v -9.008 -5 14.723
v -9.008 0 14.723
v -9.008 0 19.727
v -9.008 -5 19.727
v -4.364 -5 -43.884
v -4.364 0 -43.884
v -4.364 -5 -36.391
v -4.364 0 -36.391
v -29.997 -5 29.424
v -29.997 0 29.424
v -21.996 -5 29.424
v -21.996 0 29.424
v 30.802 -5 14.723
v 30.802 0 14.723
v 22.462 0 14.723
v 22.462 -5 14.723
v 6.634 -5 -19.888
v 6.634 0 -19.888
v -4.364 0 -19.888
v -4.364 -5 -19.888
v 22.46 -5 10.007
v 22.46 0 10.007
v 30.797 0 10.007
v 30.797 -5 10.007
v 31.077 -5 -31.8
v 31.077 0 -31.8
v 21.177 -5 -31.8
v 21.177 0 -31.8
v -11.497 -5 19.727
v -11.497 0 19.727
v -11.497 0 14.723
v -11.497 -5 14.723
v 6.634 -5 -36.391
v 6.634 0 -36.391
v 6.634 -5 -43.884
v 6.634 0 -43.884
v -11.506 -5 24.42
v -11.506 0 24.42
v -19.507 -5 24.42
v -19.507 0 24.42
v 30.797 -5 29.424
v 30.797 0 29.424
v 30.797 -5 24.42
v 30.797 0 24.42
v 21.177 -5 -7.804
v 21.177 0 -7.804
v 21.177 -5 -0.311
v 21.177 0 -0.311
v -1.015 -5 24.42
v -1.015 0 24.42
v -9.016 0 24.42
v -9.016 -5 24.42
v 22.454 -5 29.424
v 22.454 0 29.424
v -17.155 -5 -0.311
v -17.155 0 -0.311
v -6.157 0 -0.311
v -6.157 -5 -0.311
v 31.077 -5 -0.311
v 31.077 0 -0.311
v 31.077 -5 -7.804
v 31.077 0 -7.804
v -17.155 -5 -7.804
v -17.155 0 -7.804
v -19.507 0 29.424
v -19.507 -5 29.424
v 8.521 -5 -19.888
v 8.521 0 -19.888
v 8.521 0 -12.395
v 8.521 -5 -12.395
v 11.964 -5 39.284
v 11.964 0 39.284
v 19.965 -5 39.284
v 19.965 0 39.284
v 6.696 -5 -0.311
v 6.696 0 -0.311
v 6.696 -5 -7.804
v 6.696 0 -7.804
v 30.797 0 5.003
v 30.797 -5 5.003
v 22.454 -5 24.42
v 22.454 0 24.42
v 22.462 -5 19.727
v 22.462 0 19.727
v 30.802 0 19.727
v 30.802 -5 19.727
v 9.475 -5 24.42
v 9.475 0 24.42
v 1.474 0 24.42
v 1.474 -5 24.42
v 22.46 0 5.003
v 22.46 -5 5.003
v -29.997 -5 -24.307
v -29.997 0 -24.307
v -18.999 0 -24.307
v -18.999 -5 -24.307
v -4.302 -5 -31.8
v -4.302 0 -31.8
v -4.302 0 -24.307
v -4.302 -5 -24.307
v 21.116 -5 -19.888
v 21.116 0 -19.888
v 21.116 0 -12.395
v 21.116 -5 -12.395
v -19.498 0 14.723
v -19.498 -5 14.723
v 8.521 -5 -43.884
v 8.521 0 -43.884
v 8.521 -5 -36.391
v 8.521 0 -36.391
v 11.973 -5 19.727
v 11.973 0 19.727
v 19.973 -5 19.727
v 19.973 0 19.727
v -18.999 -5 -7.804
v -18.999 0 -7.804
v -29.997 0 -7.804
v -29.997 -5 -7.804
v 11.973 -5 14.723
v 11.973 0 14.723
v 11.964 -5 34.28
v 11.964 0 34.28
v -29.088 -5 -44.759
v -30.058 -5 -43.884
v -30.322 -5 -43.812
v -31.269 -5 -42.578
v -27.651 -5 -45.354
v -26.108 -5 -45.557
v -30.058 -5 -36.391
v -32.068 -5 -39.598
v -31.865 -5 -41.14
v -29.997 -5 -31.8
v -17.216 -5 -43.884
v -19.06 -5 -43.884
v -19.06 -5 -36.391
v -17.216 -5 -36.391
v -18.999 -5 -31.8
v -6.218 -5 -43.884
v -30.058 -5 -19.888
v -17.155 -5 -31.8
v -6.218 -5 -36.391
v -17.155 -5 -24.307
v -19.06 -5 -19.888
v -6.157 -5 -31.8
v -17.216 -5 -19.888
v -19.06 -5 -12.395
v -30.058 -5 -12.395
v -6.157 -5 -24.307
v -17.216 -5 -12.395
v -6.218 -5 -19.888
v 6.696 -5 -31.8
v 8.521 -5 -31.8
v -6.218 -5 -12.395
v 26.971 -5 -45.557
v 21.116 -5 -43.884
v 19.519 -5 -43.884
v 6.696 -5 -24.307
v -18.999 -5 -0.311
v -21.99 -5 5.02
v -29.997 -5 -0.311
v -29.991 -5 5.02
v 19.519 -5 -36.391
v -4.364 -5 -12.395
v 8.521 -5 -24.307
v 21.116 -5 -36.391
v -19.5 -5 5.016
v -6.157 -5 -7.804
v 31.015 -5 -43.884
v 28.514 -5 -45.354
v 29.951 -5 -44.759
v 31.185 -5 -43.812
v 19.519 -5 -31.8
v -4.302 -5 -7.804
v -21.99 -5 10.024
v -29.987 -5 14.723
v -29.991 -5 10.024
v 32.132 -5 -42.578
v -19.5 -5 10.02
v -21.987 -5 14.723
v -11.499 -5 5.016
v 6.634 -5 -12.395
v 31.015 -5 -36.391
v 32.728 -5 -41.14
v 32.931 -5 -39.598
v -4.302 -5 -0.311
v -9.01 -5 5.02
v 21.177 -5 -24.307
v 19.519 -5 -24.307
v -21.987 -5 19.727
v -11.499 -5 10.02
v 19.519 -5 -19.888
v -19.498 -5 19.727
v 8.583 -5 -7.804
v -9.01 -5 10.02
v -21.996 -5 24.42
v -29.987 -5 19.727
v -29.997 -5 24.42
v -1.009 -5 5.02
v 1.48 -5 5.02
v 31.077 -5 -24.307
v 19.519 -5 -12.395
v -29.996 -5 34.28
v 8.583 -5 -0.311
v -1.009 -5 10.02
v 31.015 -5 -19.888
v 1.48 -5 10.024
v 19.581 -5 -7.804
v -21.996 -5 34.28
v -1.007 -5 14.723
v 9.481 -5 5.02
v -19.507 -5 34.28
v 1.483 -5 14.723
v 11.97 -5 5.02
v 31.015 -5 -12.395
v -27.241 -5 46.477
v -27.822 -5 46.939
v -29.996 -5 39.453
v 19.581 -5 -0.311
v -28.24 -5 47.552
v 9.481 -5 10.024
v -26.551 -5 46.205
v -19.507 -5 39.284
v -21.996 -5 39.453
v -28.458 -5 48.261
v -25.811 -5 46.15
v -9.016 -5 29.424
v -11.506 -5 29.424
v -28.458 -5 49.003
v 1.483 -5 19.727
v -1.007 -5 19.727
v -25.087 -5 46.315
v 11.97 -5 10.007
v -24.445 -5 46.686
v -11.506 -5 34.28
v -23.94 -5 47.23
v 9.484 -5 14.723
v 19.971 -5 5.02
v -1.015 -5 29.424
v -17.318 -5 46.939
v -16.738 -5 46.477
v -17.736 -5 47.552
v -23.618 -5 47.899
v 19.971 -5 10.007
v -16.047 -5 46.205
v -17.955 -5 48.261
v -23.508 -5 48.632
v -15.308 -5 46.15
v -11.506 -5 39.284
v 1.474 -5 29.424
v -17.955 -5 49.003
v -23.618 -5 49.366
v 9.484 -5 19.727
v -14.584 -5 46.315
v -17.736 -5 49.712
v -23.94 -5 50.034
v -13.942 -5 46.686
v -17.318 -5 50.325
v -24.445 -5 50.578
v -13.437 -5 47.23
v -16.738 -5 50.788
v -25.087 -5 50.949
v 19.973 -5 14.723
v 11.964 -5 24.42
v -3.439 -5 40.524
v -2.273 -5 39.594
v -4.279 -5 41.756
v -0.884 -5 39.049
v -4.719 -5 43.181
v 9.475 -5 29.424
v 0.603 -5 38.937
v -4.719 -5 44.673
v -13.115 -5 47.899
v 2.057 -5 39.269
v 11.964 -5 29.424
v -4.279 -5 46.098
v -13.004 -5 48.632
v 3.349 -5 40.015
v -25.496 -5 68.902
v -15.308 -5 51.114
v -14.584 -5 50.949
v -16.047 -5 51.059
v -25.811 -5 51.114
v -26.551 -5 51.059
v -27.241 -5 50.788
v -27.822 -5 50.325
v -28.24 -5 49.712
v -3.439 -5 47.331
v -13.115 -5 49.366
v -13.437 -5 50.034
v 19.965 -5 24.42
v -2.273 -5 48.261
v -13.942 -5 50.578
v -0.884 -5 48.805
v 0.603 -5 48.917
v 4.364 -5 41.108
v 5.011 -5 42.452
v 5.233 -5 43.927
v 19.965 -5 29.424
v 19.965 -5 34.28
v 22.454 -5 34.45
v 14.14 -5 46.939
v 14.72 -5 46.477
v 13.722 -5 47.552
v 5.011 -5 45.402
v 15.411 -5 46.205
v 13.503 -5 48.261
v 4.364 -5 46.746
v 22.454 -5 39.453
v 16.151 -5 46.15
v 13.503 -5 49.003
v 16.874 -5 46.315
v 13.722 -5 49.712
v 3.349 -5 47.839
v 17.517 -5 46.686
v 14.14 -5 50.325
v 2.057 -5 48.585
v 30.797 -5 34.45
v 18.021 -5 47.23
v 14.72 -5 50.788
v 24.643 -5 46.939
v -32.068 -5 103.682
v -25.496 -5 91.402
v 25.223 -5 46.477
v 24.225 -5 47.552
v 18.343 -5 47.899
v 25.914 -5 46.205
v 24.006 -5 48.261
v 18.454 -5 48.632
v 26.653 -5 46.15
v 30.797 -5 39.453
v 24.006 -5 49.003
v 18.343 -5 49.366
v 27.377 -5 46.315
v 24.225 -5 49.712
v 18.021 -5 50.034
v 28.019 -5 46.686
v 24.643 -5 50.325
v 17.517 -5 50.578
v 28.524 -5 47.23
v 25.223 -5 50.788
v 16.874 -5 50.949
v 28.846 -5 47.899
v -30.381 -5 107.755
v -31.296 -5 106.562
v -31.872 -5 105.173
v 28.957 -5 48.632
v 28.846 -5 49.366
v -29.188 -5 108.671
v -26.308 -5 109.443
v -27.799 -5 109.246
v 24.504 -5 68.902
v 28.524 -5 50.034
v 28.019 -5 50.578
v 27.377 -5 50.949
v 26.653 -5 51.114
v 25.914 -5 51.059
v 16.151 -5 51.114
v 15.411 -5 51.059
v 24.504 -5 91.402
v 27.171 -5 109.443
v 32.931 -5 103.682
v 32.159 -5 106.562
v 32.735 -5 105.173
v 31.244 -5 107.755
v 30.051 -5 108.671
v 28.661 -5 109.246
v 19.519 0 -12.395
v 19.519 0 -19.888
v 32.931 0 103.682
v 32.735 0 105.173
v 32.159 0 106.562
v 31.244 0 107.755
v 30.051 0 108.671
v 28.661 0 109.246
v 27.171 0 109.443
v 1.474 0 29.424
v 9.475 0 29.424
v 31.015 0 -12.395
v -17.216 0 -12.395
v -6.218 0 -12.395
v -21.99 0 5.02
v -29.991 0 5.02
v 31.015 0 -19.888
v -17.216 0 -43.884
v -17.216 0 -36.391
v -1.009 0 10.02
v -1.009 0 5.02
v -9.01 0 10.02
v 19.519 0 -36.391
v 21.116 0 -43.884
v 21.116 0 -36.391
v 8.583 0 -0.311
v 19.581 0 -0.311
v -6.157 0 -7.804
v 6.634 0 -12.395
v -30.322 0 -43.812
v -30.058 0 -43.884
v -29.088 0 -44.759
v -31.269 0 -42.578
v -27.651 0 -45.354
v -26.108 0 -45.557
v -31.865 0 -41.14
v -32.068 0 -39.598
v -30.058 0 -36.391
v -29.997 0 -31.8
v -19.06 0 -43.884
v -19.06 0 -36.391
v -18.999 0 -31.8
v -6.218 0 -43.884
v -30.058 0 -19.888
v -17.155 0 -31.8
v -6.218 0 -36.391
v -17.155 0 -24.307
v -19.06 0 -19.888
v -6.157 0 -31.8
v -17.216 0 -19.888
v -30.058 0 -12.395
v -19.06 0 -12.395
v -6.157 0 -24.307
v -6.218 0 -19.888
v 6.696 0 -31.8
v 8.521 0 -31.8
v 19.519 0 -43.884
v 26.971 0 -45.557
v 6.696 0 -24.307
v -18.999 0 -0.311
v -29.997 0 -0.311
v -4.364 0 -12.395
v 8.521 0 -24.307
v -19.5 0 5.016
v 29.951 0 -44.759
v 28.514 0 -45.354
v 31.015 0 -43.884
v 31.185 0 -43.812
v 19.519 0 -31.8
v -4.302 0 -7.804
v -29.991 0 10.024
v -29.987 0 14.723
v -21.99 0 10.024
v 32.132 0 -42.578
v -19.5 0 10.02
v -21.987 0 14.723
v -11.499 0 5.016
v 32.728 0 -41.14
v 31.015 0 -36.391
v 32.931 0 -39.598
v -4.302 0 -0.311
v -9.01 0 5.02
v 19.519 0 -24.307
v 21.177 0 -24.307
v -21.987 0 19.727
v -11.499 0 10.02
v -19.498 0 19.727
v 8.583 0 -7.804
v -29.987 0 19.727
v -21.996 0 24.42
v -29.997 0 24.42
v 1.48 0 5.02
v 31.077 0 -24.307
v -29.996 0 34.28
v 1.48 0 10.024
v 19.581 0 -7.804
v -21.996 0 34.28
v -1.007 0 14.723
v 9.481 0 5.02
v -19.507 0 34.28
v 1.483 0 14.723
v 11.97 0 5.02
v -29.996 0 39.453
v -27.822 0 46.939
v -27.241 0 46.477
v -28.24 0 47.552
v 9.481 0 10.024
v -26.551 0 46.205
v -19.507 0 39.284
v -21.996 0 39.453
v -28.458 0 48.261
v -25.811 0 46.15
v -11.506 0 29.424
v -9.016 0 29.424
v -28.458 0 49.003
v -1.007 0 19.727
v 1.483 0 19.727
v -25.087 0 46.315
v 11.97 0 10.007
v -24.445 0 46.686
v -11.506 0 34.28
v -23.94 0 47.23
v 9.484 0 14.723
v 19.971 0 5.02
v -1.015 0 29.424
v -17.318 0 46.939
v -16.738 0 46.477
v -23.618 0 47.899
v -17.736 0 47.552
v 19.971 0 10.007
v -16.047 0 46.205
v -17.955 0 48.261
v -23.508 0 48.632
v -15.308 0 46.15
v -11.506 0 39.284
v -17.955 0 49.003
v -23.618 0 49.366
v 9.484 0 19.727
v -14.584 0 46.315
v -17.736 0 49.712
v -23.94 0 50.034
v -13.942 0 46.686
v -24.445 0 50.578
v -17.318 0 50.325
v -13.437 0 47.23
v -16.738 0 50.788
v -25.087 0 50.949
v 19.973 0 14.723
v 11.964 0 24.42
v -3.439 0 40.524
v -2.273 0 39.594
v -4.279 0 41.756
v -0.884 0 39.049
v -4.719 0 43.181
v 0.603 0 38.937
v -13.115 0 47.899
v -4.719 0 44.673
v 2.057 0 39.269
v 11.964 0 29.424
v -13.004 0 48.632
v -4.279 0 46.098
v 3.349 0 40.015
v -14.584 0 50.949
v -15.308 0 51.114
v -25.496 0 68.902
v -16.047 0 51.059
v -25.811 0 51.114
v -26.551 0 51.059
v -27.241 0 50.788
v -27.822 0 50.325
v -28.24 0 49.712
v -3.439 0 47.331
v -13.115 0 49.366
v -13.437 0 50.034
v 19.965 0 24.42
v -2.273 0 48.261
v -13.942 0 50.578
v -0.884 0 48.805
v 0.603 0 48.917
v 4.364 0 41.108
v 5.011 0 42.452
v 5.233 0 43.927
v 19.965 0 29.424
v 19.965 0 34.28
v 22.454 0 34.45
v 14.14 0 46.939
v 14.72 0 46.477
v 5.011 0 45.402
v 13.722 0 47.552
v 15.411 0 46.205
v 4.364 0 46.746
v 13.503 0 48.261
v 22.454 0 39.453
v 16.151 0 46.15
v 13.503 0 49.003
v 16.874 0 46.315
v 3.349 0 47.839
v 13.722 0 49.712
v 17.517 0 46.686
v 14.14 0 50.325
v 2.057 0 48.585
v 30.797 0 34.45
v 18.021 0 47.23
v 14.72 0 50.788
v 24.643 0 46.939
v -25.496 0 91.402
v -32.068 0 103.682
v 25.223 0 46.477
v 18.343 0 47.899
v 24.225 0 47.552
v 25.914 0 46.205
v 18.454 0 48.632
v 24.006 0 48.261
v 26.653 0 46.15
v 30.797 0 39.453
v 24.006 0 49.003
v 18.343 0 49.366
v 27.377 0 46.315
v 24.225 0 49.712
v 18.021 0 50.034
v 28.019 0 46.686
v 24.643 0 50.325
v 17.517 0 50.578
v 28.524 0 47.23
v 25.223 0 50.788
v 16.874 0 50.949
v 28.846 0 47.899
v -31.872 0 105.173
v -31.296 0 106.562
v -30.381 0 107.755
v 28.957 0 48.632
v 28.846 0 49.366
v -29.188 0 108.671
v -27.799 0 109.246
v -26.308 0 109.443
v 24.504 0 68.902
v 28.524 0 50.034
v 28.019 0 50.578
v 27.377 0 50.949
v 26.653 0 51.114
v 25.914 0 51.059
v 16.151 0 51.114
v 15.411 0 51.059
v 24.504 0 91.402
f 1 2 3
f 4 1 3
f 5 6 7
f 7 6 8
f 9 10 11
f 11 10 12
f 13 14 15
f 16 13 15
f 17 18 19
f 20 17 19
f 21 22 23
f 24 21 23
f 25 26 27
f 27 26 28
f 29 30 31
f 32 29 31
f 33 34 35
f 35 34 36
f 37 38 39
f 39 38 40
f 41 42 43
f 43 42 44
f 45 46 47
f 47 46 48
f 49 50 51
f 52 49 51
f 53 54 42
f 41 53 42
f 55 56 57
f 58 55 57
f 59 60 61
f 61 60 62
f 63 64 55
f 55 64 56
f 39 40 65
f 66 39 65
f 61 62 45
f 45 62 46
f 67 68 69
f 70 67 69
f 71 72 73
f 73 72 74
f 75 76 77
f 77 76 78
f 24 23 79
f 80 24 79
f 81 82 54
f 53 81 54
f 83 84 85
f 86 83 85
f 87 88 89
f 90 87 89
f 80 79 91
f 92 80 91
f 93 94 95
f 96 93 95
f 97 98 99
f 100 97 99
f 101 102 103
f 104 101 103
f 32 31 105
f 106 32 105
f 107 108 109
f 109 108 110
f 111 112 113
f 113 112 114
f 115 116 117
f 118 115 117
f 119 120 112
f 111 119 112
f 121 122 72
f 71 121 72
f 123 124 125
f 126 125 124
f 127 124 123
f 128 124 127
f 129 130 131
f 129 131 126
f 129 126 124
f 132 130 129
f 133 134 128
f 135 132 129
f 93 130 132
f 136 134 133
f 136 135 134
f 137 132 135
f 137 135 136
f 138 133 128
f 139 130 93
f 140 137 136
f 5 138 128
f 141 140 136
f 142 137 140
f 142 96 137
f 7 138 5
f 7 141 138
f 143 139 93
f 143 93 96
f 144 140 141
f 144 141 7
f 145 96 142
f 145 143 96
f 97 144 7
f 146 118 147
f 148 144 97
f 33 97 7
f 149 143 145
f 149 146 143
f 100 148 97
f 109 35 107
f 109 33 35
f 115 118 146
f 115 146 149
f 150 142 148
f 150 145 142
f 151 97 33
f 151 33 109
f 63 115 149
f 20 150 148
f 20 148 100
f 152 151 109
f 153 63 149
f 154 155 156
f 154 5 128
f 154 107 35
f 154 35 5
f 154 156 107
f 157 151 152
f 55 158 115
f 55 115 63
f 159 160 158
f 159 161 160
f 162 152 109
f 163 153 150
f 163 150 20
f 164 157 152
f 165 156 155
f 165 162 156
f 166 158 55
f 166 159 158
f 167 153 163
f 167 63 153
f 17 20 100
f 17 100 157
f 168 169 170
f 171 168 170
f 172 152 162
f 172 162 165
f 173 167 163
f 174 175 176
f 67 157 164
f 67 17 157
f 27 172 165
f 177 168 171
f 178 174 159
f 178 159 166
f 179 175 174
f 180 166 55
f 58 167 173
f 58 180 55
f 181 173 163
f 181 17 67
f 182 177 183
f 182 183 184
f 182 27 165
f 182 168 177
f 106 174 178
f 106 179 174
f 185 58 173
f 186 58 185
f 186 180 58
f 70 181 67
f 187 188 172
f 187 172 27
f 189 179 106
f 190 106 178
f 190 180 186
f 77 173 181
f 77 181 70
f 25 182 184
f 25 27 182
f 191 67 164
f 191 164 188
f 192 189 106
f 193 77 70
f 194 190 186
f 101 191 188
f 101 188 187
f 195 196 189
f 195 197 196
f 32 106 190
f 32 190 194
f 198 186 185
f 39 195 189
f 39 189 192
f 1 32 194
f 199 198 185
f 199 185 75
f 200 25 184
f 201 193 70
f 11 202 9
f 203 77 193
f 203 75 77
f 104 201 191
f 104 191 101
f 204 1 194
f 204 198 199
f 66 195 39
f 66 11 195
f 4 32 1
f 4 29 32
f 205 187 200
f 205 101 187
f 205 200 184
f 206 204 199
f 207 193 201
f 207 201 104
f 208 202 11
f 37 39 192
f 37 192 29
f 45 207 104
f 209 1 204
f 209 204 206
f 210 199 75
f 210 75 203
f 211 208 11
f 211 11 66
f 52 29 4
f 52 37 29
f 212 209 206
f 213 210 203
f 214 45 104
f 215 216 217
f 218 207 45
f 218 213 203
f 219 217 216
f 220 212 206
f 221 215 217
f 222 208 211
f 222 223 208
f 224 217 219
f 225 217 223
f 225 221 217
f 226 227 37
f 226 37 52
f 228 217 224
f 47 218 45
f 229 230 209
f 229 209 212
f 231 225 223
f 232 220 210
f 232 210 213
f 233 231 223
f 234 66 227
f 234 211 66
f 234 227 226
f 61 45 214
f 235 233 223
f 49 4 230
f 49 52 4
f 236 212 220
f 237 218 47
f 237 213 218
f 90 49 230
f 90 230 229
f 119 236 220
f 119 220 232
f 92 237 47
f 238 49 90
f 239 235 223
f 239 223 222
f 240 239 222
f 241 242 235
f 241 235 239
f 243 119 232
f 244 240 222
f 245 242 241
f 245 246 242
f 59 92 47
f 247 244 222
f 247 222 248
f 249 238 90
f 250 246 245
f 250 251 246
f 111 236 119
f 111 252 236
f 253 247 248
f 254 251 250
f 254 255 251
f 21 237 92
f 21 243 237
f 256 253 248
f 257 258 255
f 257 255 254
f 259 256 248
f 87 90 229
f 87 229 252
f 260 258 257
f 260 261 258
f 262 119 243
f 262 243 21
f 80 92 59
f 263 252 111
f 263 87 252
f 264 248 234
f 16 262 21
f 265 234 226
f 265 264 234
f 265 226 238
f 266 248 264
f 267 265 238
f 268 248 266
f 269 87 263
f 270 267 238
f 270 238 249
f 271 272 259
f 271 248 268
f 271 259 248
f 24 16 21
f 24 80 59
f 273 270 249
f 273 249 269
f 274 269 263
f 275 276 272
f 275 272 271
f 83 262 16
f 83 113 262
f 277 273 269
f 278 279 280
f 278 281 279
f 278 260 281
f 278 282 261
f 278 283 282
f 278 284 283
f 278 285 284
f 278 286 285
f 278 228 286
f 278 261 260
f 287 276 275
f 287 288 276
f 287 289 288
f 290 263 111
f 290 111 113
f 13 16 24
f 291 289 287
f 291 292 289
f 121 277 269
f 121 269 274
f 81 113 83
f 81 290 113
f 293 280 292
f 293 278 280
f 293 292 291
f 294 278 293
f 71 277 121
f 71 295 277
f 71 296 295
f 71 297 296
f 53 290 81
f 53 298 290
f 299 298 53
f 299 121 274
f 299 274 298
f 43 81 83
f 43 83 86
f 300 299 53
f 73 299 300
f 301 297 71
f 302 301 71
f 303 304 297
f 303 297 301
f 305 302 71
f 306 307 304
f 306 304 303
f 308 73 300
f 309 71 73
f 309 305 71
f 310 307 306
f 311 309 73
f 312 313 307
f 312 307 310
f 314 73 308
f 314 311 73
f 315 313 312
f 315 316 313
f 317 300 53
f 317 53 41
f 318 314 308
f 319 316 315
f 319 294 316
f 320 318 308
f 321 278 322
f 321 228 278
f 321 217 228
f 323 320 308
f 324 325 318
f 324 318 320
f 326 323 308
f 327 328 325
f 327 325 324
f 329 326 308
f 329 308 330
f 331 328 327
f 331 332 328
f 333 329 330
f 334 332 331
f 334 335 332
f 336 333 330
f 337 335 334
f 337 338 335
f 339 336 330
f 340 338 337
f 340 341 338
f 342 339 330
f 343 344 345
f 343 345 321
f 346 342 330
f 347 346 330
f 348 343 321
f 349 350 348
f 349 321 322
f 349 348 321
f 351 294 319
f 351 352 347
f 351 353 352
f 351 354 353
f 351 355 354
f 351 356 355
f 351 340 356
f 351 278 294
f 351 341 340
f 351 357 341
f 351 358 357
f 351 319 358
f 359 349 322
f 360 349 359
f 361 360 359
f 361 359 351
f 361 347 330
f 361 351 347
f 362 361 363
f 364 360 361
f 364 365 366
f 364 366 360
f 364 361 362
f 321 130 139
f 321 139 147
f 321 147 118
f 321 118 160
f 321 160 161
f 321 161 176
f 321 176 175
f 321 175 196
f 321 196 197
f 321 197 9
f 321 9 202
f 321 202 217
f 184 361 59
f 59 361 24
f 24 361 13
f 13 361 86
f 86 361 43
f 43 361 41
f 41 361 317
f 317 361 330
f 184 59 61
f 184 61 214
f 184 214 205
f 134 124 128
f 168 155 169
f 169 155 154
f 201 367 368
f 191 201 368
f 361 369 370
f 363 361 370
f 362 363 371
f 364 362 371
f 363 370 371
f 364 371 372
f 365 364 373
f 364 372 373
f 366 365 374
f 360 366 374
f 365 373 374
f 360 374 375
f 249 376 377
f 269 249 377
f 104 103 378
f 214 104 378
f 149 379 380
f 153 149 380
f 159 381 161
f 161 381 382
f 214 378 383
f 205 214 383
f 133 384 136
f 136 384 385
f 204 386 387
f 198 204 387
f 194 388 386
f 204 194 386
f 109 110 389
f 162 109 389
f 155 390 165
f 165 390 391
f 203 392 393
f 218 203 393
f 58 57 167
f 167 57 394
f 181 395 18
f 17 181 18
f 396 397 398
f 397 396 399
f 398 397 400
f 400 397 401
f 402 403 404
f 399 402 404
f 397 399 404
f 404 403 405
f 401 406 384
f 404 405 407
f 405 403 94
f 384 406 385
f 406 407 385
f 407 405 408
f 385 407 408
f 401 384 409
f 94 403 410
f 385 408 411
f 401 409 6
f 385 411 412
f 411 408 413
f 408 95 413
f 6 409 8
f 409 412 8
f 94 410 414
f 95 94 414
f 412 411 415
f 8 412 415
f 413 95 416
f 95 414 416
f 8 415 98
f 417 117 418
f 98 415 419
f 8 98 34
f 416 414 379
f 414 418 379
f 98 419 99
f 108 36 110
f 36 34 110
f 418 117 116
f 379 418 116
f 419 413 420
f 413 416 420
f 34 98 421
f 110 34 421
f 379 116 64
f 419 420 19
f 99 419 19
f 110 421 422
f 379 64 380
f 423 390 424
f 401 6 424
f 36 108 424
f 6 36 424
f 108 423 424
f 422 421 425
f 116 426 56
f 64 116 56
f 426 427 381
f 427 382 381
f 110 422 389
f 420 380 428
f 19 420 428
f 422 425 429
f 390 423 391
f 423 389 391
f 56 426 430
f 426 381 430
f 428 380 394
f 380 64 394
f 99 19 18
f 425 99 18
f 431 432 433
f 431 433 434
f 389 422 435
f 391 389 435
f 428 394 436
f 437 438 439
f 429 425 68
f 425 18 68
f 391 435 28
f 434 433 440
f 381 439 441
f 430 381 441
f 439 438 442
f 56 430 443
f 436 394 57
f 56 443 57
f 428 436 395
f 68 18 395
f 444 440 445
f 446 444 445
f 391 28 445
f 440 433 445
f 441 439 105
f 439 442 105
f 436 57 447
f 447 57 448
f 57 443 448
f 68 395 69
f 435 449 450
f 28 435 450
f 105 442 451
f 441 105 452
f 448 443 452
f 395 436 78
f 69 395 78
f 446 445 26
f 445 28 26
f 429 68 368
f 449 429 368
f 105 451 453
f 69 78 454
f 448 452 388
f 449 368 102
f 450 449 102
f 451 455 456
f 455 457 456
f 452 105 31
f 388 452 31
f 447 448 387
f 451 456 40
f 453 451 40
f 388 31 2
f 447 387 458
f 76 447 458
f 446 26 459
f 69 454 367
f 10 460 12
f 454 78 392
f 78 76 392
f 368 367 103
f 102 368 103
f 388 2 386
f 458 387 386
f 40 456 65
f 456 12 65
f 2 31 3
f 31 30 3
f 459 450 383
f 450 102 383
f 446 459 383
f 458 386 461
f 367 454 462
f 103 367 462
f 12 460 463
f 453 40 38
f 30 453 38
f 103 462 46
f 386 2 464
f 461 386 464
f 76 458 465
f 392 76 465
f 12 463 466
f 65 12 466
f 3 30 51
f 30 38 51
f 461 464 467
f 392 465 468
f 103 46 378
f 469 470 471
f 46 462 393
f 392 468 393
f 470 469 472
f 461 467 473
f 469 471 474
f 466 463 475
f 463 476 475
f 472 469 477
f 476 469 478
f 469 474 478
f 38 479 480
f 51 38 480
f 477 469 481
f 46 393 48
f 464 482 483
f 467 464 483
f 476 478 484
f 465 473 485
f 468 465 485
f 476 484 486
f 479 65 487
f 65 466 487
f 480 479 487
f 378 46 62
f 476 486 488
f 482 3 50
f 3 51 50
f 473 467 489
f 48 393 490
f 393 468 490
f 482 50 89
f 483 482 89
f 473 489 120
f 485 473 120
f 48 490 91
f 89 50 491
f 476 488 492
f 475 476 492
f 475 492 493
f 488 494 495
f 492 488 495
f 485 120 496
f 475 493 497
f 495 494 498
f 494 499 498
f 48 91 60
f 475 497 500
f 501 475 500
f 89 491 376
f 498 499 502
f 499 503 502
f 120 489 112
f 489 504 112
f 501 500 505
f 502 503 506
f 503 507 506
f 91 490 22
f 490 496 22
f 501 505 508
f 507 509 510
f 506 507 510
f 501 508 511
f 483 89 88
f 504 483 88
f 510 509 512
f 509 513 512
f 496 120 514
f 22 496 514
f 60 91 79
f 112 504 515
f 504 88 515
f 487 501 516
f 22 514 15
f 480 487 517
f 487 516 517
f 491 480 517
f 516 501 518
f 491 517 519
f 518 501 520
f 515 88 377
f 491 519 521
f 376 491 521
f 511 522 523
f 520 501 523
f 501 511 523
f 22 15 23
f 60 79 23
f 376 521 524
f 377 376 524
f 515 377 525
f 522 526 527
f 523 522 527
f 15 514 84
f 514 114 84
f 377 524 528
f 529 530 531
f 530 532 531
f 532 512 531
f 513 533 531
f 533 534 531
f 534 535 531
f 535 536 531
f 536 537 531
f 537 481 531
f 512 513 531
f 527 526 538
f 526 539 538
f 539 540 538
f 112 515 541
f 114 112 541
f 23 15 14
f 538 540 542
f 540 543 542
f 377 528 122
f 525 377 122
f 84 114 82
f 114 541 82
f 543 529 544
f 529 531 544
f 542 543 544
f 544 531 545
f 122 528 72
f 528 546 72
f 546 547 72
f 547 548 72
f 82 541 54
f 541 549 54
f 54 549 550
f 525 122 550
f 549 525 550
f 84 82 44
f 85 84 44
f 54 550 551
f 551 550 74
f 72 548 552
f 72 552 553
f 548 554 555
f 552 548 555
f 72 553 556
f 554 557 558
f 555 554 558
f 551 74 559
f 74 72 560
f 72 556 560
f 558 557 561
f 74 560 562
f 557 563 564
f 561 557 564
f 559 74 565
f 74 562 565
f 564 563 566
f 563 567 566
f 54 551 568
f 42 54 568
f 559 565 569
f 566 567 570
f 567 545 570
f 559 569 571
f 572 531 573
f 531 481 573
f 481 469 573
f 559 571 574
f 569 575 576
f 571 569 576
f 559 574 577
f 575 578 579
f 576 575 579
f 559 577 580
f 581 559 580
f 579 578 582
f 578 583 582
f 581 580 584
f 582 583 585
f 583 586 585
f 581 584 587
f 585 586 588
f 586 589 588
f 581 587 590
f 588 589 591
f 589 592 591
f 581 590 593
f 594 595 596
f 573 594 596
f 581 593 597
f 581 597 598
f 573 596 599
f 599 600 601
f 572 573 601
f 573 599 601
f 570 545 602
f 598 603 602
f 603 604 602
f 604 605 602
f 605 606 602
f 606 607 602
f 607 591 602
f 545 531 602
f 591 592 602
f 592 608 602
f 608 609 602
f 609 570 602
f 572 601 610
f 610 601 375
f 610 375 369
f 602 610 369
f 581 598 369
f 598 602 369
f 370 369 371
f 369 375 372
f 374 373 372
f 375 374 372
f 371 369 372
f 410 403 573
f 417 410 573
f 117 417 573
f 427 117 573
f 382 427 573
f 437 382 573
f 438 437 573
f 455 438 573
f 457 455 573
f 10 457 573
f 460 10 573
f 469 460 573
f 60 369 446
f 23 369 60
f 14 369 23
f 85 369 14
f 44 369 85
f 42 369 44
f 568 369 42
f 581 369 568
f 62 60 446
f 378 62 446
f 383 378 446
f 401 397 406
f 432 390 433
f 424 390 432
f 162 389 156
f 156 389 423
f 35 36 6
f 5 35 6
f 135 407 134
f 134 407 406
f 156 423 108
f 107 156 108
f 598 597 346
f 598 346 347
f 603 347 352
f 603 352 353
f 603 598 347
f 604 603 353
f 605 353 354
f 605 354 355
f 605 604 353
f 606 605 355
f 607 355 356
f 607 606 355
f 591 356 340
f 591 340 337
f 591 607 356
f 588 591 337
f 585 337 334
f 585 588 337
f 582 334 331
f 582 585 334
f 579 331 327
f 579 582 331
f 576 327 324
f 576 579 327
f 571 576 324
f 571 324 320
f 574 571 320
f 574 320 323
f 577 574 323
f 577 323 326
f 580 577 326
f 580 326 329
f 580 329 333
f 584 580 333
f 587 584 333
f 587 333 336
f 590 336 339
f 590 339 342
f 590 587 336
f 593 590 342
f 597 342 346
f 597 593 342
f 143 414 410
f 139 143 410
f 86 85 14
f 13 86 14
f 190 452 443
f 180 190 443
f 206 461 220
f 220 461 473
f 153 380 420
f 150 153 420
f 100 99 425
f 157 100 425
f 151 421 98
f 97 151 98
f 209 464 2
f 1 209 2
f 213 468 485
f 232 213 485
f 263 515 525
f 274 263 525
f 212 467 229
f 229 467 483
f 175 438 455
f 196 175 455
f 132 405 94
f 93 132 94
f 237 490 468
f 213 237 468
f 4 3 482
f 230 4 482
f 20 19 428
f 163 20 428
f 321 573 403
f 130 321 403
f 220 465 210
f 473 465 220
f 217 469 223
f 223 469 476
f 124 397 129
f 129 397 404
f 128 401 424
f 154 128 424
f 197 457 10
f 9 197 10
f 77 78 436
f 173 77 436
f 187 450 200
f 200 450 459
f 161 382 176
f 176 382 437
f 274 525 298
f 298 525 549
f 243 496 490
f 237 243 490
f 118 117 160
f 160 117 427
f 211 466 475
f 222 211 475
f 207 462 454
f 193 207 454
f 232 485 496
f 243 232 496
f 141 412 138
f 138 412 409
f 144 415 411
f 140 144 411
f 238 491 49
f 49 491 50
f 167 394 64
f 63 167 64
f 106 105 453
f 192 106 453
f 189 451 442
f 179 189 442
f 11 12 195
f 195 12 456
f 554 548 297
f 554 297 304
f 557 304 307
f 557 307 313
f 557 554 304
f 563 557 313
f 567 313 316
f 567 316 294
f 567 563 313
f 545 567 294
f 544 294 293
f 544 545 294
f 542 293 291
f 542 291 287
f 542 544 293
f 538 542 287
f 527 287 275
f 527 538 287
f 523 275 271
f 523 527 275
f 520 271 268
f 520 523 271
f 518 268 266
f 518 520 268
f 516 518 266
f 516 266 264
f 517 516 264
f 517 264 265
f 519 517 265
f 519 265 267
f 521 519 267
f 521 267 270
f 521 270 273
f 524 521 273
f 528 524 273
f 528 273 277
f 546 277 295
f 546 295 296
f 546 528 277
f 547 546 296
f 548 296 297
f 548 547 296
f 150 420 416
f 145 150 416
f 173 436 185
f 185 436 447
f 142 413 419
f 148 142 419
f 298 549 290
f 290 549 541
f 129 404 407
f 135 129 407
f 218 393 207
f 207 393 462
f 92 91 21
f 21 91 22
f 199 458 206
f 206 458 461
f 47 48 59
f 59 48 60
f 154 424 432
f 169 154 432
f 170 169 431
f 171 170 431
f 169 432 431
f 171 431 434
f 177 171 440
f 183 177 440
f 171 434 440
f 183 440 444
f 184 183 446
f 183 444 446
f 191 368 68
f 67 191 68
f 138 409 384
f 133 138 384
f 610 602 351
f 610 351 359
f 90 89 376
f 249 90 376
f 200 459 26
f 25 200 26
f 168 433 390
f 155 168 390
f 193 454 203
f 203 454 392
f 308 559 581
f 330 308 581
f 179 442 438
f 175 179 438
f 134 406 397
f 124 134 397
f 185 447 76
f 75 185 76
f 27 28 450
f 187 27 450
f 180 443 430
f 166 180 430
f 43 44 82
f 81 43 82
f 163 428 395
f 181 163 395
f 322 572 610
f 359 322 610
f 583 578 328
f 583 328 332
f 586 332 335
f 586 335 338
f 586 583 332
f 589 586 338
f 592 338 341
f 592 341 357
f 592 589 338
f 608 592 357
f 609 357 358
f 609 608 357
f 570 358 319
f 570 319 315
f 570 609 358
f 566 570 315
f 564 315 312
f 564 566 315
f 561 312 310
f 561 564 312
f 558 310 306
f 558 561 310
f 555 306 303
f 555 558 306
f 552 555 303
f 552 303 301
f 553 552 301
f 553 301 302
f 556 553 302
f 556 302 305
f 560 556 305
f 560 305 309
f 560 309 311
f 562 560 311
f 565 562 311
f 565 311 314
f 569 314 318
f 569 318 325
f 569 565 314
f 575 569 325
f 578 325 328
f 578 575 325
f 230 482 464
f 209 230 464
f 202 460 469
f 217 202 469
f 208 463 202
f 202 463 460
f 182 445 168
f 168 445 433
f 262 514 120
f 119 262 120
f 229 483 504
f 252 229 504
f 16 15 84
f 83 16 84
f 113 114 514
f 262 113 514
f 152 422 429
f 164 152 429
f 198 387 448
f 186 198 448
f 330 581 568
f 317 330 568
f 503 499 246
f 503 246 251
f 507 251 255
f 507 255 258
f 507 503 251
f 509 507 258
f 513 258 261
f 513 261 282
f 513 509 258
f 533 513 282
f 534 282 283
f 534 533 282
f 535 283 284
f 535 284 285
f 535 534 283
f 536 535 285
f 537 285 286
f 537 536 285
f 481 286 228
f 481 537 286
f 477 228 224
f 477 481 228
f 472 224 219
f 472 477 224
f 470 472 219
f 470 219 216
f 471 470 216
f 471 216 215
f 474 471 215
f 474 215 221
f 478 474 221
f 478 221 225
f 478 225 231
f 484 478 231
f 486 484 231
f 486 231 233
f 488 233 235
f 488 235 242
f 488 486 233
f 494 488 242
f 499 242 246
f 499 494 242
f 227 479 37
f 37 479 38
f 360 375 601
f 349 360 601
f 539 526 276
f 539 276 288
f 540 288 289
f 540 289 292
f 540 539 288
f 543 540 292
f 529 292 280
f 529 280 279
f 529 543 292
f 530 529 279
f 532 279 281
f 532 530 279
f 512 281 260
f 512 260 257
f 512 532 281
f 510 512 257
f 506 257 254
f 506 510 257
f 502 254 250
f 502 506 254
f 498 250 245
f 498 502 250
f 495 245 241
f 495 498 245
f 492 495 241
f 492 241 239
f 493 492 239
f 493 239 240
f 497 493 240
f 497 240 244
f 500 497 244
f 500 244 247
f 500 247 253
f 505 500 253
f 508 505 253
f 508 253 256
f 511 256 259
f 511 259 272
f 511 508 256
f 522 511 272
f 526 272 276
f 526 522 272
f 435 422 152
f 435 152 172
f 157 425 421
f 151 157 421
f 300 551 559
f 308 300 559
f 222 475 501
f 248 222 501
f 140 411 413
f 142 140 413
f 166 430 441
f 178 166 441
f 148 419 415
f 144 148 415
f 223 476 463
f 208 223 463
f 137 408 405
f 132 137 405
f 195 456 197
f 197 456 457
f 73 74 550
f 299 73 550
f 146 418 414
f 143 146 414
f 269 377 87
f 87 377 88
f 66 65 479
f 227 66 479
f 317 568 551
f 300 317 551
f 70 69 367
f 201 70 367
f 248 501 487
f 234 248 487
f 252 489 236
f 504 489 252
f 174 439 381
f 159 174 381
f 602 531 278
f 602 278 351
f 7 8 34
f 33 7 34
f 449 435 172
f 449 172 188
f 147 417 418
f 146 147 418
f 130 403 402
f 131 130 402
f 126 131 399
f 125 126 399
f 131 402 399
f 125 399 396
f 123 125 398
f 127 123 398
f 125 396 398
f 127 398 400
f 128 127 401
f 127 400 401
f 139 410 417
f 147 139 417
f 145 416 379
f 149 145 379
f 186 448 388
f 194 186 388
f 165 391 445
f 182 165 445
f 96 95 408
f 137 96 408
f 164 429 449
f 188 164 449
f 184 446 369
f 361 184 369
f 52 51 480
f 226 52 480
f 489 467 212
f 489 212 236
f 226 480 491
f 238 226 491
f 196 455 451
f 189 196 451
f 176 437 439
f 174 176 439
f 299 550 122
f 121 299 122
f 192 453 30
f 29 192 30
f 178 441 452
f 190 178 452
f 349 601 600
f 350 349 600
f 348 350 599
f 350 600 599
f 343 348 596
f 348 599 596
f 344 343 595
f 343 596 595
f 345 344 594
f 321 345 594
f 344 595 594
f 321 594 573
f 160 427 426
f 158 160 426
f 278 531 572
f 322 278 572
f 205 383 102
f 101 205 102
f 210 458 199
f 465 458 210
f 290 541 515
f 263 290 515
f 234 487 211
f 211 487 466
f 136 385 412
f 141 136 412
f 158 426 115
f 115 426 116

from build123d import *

# Parameters (mm, degrees)
F0_W     = 10.9982
F0_H     = 7.493
F0_W_2   = 8.001
F0_H_2   = 5.0038
F0_R     = 2.4892
F0_R_2   = 5.0038
F1_DEPTH = 5
F0_W_3   = 50
F0_H_3   = 22.5
F2_DEPTH = 5


with BuildPart() as f1:
    # F0 (on Front) → F1 (new body)
    with BuildSketch(Plane.XZ):
        with BuildLine():
            Line((32.930795, 54.273571), (-32.067805, 54.273571))
            Line((-32.067805, 54.273571), (-32.067805, -39.597668))
            ThreePointArc((-32.067805, -39.597668), (-30.322229, -43.811862), (-26.108036, -45.557438))
            Line((-26.108036, -45.557438), (26.971026, -45.557438))
            ThreePointArc((26.971026, -45.557438), (31.185219, -43.811862), (32.930795, -39.597668))
            Line((32.930795, -39.597668), (32.930795, 54.273571))
        make_face()
        Polygon((-24.558977, -43.883898), (-30.058077, -43.883898), (-30.058077, -36.390898), (-19.059877, -36.390898), (-19.059877, -43.883898), align=None, mode=Mode.SUBTRACT)
        Polygon((-24.497674, -31.799856), (-29.996774, -31.799856), (-29.996774, -24.306856), (-18.998574, -24.306856), (-18.998574, -31.799856), align=None, mode=Mode.SUBTRACT)
        Polygon((-24.558977, -19.887637), (-30.058077, -19.887637), (-30.058077, -12.394637), (-19.059877, -12.394637), (-19.059877, -19.887637), align=None, mode=Mode.SUBTRACT)
        Polygon((-11.717032, -43.883901), (-17.216132, -43.883901), (-17.216132, -36.390901), (-6.217932, -36.390901), (-6.217932, -43.883901), align=None, mode=Mode.SUBTRACT)
        Polygon((-11.655728, -31.799859), (-17.154828, -31.799859), (-17.154828, -24.306859), (-6.156628, -24.306859), (-6.156628, -31.799859), align=None, mode=Mode.SUBTRACT)
        Polygon((-11.717032, -19.887639), (-17.216132, -19.887639), (-17.216132, -12.394639), (-6.217932, -12.394639), (-6.217932, -19.887639), align=None, mode=Mode.SUBTRACT)
        Polygon((-24.497674, -7.803595), (-29.996774, -7.803595), (-29.996774, -0.310595), (-18.998574, -0.310595), (-18.998574, -7.803595), align=None, mode=Mode.SUBTRACT)
        Polygon((-27.643991, 5.020094), (-29.990563, 5.020094), (-29.990563, 10.023894), (-21.989563, 10.023894), (-21.989563, 5.020094), align=None, mode=Mode.SUBTRACT)
        Polygon((-26.28431, 14.722894), (-29.987015, 14.722894), (-29.987015, 19.726694), (-21.987015, 19.726694), (-21.987015, 14.722894), align=None, mode=Mode.SUBTRACT)
        Polygon((-25.983574, 24.419945), (-29.996774, 24.419945), (-29.996774, 29.423745), (-21.995774, 29.423745), (-21.995774, 24.419945), align=None, mode=Mode.SUBTRACT)
        Polygon((-11.655728, -7.803598), (-17.154828, -7.803598), (-17.154828, -0.310598), (-6.156628, -0.310598), (-6.156628, -7.803598), align=None, mode=Mode.SUBTRACT)
        Polygon((-17.148439, 5.016294), (-19.500365, 5.016294), (-19.500365, 10.020094), (-11.499365, 10.020094), (-11.499365, 5.016294), align=None, mode=Mode.SUBTRACT)
        Polygon((-7.183166, 5.020094), (-9.010165, 5.020094), (-9.010165, 10.020094), (-1.009165, 10.020094), (-1.009165, 5.020094), align=None, mode=Mode.SUBTRACT)
        Polygon((-15.484615, 14.722894), (-19.497815, 14.722894), (-19.497815, 19.726694), (-11.496815, 19.726694), (-11.496815, 14.722894), align=None, mode=Mode.SUBTRACT)
        Polygon((-15.493374, 24.419945), (-19.506574, 24.419945), (-19.506574, 29.423745), (-11.505574, 29.423745), (-11.505574, 24.419945), align=None, mode=Mode.SUBTRACT)
        Polygon((-5.823485, 14.722894), (-9.007615, 14.722894), (-9.007615, 19.726694), (-1.006615, 19.726694), (-1.006615, 14.722894), align=None, mode=Mode.SUBTRACT)
        Polygon((-5.52275, 24.419945), (-9.016374, 24.419945), (-9.016374, 29.423745), (-1.015374, 29.423745), (-1.015374, 24.419945), align=None, mode=Mode.SUBTRACT)
        Polygon((1.135368, -43.883901), (-4.363732, -43.883901), (-4.363732, -36.390901), (6.634468, -36.390901), (6.634468, -43.883901), align=None, mode=Mode.SUBTRACT)
        Polygon((1.196672, -31.799859), (-4.302428, -31.799859), (-4.302428, -24.306859), (6.695772, -24.306859), (6.695772, -31.799859), align=None, mode=Mode.SUBTRACT)
        Polygon((14.020374, -43.883901), (8.521274, -43.883901), (8.521274, -36.390901), (19.519474, -36.390901), (19.519474, -43.883901), align=None, mode=Mode.SUBTRACT)
        with Locations((14.020374, -28.053359)):
            Rectangle(F0_W, F0_H, mode=Mode.SUBTRACT)
        Polygon((1.135368, -19.887639), (-4.363732, -19.887639), (-4.363732, -12.394639), (6.634468, -12.394639), (6.634468, -19.887639), align=None, mode=Mode.SUBTRACT)
        Polygon((14.020374, -19.887639), (8.521274, -19.887639), (8.521274, -12.394639), (19.519474, -12.394639), (19.519474, -19.887639), align=None, mode=Mode.SUBTRACT)
        Polygon((25.782729, -43.883901), (21.115824, -43.883901), (21.115824, -36.390901), (31.015452, -36.390901), (31.015452, -43.883901), align=None, mode=Mode.SUBTRACT)
        Polygon((25.844033, -31.799859), (21.177127, -31.799859), (21.177127, -24.306859), (31.076756, -24.306859), (31.076756, -31.799859), align=None, mode=Mode.SUBTRACT)
        Polygon((25.782729, -19.887639), (21.115824, -19.887639), (21.115824, -12.394639), (31.015452, -12.394639), (31.015452, -19.887639), align=None, mode=Mode.SUBTRACT)
        Polygon((1.196672, -7.803598), (-4.302428, -7.803598), (-4.302428, -0.310598), (6.695772, -0.310598), (6.695772, -7.803598), align=None, mode=Mode.SUBTRACT)
        with Locations((5.480535, 7.521994)):
            Rectangle(F0_W_2, F0_H_2, mode=Mode.SUBTRACT)
        Polygon((14.081677, -7.803598), (8.582577, -7.803598), (8.582577, -0.310598), (19.580777, -0.310598), (19.580777, -7.803598), align=None, mode=Mode.SUBTRACT)
        Polygon((12.818122, 5.020094), (11.970235, 5.020094), (11.970235, 10.006707), (19.971235, 10.006707), (19.971235, 5.020094), align=None, mode=Mode.SUBTRACT)
        with Locations((5.483085, 17.224794)):
            Rectangle(F0_W_2, F0_H_2, mode=Mode.SUBTRACT)
        Polygon((9.474826, 24.419945), (1.473826, 24.419945), (1.473826, 29.423745), (9.474826, 29.423745), (9.474826, 26.934545), align=None, mode=Mode.SUBTRACT)
        Polygon((14.177803, 14.722894), (11.972785, 14.722894), (11.972785, 19.726694), (19.972785, 19.726694), (19.972785, 14.722894), align=None, mode=Mode.SUBTRACT)
        Polygon((14.478539, 24.419945), (11.964026, 24.419945), (11.964026, 29.423745), (19.965026, 29.423745), (19.965026, 24.419945), align=None, mode=Mode.SUBTRACT)
        Polygon((25.844033, -7.803598), (21.177127, -7.803598), (21.177127, -0.310598), (31.076756, -0.310598), (31.076756, -7.803598), align=None, mode=Mode.SUBTRACT)
        Polygon((24.846989, 5.002907), (22.460435, 5.002907), (22.460435, 10.006707), (30.797195, 10.006707), (30.797195, 5.002907), align=None, mode=Mode.SUBTRACT)
        Polygon((26.16669, 14.722894), (22.461985, 14.722894), (22.461985, 19.726694), (30.801985, 19.726694), (30.801985, 14.722894), align=None, mode=Mode.SUBTRACT)
        Polygon((26.467426, 24.419945), (22.454226, 24.419945), (22.454226, 29.423745), (30.796636, 29.423745), (30.796636, 24.419945), align=None, mode=Mode.SUBTRACT)
        Polygon((-25.983574, 34.27997), (-29.996351, 34.27997), (-29.996351, 39.453434), (-21.995774, 39.453434), (-21.995774, 34.27997), align=None, mode=Mode.SUBTRACT)
        with Locations((-25.996883, 48.632245)):
            Circle(F0_R, mode=Mode.SUBTRACT)
        Polygon((-15.493374, 34.279969), (-19.506574, 34.279969), (-19.506574, 39.283769), (-11.505574, 39.283769), (-11.505574, 34.279969), align=None, mode=Mode.SUBTRACT)
        with Locations((-15.493563, 48.632245)):
            Circle(F0_R, mode=Mode.SUBTRACT)
        with Locations((0.229226, 43.927145)):
            Circle(F0_R_2, mode=Mode.SUBTRACT)
        Polygon((14.478539, 34.27997), (11.964026, 34.27997), (11.964026, 39.28377), (19.965026, 39.28377), (19.965026, 34.27997), (15.964526, 34.27997), align=None, mode=Mode.SUBTRACT)
        with Locations((15.964526, 48.632245)):
            Circle(F0_R, mode=Mode.SUBTRACT)
        Polygon((26.467426, 34.449634), (22.454226, 34.449634), (22.454226, 39.453434), (30.796636, 39.453434), (30.796636, 34.449634), align=None, mode=Mode.SUBTRACT)
        with Locations((26.467426, 48.632245)):
            Circle(F0_R, mode=Mode.SUBTRACT)
    extrude(amount=F1_DEPTH)

    # F0 (on Front) → F2 (join)
    with BuildSketch(Plane.XZ):
        with BuildLine():
            Line((-32.067805, 103.682429), (-32.067805, 54.273571))
            Line((-32.067805, 54.273571), (32.930795, 54.273571))
            Line((32.930795, 54.273571), (32.930795, 103.682429))
            ThreePointArc((32.930795, 103.682429), (31.243691, 107.755458), (27.170661, 109.442562))
            Line((27.170661, 109.442562), (-26.307672, 109.442562))
            ThreePointArc((-26.307672, 109.442562), (-30.380701, 107.755458), (-32.067805, 103.682429))
        make_face()
        with Locations((-0.495507, 80.151956)):
            Rectangle(F0_W_3, F0_H_3, mode=Mode.SUBTRACT)
    extrude(amount=F2_DEPTH)


solid = f1.part
